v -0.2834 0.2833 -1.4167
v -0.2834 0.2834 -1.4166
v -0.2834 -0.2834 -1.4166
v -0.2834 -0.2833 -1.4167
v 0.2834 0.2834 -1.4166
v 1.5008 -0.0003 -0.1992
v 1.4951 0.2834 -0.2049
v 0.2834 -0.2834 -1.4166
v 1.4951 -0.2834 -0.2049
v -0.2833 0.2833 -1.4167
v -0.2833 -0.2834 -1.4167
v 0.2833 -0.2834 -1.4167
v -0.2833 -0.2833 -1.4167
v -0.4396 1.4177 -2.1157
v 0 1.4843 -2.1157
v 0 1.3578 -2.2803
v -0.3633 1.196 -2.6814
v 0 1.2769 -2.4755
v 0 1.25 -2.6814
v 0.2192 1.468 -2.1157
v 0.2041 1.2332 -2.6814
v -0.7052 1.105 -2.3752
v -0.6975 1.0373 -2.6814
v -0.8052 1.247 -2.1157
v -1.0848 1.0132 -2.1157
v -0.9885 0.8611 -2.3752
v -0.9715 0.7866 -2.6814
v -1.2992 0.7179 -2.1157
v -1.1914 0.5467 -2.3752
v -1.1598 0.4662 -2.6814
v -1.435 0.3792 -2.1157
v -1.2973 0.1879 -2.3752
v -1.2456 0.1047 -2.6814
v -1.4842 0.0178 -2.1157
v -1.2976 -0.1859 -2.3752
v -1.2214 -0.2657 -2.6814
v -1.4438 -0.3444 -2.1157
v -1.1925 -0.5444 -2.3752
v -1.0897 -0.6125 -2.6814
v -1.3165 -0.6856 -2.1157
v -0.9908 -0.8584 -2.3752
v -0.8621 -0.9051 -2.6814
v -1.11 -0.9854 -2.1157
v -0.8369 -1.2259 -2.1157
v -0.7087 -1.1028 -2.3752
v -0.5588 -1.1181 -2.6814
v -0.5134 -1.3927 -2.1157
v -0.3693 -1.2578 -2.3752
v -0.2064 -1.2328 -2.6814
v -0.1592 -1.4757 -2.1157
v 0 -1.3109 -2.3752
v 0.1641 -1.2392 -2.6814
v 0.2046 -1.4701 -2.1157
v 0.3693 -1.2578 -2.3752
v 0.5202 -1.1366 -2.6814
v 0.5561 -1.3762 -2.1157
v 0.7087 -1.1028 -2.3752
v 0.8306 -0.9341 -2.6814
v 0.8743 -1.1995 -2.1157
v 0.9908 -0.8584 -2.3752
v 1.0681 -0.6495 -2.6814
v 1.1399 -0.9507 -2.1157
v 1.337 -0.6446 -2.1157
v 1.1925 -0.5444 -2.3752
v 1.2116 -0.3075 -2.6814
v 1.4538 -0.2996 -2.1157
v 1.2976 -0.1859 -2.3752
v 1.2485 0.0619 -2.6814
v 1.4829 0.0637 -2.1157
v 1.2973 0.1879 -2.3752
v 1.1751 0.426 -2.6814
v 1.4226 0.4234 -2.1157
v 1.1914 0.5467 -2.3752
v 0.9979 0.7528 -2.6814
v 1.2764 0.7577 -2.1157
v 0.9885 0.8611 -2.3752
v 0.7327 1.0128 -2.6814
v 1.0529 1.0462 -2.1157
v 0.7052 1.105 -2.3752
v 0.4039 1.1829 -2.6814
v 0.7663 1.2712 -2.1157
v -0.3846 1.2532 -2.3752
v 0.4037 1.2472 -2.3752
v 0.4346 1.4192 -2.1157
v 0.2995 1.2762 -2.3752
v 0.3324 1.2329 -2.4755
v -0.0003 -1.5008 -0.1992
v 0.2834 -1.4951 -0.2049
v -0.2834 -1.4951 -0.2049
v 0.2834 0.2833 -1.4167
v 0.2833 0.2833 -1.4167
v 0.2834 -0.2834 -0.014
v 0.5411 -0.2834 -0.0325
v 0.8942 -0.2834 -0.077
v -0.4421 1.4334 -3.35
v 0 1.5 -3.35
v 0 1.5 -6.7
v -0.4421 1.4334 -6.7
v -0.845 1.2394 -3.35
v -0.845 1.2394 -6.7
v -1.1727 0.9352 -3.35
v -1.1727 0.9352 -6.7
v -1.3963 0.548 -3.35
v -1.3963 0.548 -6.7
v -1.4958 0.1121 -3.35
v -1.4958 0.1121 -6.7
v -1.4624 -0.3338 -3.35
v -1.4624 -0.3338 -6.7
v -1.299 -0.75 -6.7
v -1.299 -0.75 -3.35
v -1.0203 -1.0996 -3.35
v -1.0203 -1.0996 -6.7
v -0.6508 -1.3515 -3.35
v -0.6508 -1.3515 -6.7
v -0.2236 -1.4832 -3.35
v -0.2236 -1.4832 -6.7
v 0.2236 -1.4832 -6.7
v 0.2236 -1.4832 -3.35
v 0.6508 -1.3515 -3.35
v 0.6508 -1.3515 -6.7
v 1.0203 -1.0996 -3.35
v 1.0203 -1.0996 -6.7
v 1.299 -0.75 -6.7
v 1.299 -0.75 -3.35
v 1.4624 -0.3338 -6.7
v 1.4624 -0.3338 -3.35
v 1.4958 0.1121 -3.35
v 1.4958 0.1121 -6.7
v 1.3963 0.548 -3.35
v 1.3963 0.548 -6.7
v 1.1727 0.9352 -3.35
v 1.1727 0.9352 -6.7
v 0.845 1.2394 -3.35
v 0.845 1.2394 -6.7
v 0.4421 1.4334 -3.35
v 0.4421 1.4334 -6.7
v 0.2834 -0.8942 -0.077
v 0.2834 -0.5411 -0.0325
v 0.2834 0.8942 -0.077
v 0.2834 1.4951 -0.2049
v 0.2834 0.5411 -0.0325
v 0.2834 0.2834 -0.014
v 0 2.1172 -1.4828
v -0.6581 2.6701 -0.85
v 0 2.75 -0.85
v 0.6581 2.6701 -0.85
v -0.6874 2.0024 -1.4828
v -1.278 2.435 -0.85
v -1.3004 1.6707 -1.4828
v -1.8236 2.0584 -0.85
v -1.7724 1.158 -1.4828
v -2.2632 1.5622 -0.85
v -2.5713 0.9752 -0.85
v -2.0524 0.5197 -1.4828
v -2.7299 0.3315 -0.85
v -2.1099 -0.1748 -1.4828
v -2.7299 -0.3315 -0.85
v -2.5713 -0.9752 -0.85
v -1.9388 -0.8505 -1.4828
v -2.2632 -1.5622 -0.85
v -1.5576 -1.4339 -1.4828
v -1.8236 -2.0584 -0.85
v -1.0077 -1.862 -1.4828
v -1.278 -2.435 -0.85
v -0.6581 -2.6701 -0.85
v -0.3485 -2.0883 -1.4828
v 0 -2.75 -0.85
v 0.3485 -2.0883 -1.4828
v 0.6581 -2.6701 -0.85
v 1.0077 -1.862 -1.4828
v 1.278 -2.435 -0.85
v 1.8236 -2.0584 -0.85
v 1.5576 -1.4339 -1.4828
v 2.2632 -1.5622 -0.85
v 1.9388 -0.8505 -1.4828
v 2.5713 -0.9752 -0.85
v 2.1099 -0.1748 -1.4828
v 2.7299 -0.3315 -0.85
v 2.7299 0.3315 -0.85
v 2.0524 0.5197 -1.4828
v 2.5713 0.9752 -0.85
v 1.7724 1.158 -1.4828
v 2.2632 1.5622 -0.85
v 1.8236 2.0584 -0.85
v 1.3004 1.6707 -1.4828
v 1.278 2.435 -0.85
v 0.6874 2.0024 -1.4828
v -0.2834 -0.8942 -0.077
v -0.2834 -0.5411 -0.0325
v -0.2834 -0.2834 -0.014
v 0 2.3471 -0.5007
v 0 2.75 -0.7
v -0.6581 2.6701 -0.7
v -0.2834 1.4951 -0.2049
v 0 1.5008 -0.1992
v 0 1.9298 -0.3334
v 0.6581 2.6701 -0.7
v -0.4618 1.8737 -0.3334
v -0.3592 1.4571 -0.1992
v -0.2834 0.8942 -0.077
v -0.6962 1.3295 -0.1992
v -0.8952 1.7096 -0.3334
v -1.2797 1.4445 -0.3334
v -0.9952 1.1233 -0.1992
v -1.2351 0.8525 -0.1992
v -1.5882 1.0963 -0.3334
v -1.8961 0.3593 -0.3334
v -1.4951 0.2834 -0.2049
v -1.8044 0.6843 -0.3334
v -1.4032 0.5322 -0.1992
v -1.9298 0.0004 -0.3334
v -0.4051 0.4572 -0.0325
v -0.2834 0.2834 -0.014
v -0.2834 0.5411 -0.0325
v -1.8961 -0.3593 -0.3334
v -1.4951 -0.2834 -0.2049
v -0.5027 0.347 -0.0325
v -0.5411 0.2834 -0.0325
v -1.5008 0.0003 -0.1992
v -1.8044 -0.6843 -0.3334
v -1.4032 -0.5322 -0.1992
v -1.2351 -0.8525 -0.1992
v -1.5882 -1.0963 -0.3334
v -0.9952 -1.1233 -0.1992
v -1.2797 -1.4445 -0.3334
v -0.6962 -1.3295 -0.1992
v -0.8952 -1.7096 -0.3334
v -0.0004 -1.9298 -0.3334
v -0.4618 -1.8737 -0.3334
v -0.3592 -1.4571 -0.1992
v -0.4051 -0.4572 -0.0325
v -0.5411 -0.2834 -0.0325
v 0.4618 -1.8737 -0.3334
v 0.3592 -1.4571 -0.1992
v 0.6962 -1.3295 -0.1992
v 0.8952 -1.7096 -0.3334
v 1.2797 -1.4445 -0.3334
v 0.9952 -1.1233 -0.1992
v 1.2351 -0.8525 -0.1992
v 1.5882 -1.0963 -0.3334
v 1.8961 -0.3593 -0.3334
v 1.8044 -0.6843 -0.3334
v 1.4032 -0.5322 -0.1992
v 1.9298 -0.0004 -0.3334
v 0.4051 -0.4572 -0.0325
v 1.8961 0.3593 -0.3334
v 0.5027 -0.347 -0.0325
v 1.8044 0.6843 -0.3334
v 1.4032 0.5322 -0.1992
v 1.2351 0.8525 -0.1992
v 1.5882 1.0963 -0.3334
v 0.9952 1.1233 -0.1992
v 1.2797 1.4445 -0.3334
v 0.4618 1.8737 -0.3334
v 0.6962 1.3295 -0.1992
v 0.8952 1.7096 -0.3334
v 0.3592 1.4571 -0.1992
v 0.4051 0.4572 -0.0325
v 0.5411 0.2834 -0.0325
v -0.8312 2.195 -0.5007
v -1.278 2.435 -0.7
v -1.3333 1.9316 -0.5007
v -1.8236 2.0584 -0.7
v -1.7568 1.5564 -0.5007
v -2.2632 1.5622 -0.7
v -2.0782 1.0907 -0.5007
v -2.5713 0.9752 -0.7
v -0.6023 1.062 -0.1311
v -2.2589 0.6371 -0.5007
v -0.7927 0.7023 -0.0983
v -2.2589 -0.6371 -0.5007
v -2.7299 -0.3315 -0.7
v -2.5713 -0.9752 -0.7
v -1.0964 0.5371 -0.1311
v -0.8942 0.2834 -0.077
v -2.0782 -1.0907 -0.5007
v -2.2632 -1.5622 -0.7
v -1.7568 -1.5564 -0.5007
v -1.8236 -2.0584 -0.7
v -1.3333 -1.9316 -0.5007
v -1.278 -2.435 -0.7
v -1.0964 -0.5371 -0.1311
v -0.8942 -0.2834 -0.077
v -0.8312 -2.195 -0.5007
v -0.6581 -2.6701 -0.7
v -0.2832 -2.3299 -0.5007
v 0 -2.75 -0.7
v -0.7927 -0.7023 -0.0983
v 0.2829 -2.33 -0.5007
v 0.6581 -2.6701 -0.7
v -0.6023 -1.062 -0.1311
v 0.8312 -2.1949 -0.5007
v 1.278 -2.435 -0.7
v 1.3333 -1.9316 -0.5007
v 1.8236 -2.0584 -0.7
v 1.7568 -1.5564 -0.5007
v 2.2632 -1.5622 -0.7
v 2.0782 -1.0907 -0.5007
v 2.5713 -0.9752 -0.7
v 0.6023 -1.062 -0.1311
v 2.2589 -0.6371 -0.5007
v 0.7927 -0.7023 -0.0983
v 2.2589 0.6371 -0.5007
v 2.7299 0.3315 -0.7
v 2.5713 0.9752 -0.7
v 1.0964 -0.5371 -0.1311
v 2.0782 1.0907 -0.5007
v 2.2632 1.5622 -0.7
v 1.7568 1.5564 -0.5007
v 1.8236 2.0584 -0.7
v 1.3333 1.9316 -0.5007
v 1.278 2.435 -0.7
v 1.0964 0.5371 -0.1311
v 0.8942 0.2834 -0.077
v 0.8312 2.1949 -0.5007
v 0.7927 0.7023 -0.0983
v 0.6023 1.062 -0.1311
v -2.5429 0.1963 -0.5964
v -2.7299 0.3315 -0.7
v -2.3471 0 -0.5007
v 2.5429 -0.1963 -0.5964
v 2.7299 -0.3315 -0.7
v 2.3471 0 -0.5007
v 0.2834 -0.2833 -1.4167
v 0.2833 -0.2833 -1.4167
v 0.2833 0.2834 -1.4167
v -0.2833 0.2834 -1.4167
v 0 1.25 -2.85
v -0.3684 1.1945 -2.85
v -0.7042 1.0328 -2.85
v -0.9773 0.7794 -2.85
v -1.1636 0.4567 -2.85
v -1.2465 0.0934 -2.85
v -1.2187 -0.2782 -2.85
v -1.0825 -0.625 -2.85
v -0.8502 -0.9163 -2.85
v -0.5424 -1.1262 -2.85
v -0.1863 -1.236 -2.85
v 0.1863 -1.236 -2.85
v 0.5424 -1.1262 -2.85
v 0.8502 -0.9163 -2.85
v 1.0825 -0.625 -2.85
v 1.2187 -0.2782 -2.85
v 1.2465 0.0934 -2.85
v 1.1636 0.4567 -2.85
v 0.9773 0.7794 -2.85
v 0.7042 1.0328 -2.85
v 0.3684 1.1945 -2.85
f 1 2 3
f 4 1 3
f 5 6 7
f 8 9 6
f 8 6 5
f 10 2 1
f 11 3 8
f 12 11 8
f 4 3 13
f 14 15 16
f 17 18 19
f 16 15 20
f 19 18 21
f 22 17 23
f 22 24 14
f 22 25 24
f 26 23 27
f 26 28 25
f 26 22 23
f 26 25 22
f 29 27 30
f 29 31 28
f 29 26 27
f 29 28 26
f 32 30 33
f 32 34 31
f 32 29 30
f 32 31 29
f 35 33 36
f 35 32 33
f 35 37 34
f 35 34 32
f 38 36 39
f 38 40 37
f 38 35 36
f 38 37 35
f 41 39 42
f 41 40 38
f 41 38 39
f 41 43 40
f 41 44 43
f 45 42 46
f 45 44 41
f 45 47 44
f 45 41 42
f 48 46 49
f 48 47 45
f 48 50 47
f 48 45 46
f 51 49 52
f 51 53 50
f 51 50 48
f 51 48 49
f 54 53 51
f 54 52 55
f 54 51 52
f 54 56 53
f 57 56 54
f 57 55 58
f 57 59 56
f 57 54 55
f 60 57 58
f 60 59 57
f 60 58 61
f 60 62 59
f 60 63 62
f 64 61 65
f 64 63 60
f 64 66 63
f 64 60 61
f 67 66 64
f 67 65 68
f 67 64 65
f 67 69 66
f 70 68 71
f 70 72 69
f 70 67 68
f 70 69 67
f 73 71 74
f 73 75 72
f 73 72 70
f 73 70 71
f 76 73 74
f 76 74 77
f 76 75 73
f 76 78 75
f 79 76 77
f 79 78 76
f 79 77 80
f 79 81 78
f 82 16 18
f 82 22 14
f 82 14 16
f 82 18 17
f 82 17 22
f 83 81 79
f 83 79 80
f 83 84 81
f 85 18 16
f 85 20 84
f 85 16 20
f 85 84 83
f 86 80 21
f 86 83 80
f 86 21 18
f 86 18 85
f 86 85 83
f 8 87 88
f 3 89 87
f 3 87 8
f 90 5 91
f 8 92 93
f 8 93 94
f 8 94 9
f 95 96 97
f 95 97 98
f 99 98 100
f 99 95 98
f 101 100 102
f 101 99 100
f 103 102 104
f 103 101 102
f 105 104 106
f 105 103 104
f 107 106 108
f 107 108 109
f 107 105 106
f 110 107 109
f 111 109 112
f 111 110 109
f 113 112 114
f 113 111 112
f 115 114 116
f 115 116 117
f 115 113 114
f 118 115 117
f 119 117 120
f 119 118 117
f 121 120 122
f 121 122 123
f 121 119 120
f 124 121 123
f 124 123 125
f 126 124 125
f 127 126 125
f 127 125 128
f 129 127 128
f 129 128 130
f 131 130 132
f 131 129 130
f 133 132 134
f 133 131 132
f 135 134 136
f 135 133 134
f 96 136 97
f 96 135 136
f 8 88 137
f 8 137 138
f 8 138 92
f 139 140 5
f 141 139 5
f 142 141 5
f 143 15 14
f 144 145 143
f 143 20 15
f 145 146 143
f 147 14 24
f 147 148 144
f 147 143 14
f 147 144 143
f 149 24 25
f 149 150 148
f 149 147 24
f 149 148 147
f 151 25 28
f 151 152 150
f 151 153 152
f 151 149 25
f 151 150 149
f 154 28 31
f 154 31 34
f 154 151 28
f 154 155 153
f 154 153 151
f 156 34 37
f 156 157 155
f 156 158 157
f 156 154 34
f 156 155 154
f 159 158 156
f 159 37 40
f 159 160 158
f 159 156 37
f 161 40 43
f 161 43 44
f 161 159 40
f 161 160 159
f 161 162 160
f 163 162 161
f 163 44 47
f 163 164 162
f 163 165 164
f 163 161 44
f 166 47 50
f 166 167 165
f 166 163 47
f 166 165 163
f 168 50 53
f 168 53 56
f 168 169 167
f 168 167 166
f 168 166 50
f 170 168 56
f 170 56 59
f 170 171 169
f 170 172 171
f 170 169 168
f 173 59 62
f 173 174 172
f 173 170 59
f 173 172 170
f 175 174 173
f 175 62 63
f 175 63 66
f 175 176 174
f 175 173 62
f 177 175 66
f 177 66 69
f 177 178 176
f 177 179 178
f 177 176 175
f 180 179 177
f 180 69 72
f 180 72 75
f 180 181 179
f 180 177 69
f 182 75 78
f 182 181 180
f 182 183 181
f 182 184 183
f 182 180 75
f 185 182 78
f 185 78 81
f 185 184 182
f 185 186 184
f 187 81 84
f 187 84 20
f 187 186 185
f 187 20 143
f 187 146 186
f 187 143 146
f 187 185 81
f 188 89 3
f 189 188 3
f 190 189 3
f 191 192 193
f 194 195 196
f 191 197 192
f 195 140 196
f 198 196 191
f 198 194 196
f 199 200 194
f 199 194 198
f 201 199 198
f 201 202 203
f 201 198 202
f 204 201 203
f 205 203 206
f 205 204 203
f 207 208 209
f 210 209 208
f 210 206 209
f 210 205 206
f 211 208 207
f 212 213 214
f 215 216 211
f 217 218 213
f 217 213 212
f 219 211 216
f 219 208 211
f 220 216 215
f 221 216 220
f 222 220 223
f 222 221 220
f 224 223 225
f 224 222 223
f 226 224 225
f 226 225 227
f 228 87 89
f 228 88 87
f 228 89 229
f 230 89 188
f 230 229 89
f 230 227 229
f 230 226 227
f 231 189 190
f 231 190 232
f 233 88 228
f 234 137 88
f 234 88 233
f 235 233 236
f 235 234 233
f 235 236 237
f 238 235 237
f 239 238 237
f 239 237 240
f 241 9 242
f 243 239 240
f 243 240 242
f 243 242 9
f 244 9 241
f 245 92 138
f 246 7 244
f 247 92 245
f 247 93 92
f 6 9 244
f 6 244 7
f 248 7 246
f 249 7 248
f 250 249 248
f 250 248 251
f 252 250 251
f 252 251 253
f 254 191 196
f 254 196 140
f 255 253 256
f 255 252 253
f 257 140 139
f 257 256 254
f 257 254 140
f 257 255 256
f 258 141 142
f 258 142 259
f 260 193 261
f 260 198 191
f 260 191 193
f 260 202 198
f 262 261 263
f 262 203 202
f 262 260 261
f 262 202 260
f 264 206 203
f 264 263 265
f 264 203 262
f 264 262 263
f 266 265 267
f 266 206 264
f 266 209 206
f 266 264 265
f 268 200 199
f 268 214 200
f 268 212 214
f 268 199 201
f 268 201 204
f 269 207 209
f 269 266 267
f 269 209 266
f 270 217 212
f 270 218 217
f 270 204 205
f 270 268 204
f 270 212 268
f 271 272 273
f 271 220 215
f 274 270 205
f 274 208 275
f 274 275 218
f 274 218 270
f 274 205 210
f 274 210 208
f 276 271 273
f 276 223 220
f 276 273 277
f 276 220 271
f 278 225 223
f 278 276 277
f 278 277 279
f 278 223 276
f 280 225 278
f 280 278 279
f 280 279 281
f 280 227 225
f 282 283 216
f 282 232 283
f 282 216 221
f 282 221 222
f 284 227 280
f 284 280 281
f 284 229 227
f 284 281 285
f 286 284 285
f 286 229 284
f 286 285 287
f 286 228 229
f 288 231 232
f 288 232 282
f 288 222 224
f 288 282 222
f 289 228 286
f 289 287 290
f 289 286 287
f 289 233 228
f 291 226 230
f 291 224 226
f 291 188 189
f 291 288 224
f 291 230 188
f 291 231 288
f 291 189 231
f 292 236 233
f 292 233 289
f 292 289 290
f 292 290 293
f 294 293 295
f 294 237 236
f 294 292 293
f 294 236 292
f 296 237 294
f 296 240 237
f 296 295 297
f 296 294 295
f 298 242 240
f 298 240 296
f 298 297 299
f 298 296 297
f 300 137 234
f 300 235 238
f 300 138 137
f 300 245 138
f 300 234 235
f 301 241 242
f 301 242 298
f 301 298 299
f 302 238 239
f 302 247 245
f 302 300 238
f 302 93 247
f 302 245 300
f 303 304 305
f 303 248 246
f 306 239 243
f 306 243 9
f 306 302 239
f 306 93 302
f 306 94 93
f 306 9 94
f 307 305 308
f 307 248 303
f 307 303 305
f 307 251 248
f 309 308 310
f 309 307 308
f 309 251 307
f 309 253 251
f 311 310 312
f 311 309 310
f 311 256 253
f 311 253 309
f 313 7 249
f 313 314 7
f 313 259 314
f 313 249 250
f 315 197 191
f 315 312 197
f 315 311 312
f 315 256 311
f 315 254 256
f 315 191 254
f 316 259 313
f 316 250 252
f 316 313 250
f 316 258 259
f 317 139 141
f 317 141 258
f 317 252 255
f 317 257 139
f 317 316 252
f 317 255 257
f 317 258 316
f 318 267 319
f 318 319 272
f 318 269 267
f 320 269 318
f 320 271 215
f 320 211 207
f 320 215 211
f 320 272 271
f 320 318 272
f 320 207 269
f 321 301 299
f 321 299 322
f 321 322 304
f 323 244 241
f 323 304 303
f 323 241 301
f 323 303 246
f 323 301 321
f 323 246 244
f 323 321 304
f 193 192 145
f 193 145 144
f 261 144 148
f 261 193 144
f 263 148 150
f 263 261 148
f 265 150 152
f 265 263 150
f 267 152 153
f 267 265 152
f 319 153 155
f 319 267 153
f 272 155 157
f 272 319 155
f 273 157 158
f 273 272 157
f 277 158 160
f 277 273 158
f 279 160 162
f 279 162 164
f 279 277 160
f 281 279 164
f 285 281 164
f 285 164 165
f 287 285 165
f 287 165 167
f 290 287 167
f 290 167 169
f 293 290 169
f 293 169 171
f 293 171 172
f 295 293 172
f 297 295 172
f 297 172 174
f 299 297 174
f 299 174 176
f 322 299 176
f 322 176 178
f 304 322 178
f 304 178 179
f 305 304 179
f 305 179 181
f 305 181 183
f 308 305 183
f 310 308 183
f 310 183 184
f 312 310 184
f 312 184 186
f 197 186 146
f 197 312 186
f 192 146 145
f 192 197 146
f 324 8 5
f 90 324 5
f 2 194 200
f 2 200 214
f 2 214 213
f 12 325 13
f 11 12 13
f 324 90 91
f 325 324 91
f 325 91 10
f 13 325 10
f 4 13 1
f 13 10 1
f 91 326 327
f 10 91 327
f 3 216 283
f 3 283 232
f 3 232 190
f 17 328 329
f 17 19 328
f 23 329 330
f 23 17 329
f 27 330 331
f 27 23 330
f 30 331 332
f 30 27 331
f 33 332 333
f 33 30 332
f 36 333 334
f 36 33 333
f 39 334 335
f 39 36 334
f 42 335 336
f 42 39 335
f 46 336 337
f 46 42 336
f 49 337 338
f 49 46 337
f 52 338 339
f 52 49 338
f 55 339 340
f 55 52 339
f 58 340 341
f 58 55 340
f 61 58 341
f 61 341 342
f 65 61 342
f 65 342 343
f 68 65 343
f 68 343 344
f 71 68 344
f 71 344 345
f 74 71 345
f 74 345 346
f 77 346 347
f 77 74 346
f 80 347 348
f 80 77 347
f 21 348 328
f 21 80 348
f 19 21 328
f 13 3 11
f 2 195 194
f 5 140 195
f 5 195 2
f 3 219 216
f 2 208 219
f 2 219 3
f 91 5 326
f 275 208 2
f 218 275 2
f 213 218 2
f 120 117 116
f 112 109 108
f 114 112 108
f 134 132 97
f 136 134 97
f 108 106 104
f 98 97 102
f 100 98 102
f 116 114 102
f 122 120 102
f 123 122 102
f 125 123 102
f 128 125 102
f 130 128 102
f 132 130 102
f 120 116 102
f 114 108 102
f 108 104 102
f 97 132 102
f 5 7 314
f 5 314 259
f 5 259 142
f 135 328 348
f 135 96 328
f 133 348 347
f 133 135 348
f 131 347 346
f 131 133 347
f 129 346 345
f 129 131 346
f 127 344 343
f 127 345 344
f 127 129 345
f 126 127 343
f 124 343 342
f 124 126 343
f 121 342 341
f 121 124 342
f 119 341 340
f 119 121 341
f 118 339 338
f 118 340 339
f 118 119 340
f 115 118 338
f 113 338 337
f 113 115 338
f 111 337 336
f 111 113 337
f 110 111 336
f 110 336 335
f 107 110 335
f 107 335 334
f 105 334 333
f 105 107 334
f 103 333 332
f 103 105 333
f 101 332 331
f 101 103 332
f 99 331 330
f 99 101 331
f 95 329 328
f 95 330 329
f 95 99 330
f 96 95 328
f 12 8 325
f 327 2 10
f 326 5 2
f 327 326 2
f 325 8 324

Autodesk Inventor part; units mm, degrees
ref_plane "WorkPlane2" through (0, 0, 0) normal (0, 0, 1) x (1, 0, 0)
sketch "Sketch1" plane through (0, 0, 0) normal (1, 0, 0) x (0, 1, 0)
  point P0 (0, 0)
ref_plane "Work Plane2" through (0, 0, -2.35) normal (0, 0, 1) x (1, 0, 0)
ref_plane "WorkPlane3" through (0, 0, 7) normal (0, 0, 1) x (1, 0, 0)
sketch "Sketch2" plane through (0, 0, 0) normal (0, 1, 0) x (-1, 0, 0)
  point P0 (0, 0)
sketch "Sketch3" plane through (0, 0, 0) normal (1, 0, 0) x (0, 1, 0)
  line L0 (1.5, -3.35) -> (1.25, -2.85)
  line L1 (1.5, -6.7) -> (1.5, -3.35)
  line L2 (0, -6.7) -> (1.5, -6.7)
  line L3 (0, 0) -> (0, -6.7)
  arc A0 (2.75, -0.7) -> (0, 0) centre (0, -5.7518) ccw
  line L4 (2.75, -0.85) -> (2.75, -0.7)
  line L5 (1.25, -2.35) -> (2.75, -0.85)
  line L6 (1.25, -2.85) -> (1.25, -2.35)
  line L7 (0, -31.6445) -> (0, 31.6445) construction
  line L8 (0, -31.6445) -> (0, 31.6445)
  line L9 (0, -44.3023) -> (0, 44.3023) projected
  dimension "d2" = 1.5
  dimension "d4" = 1.25
  dimension "d6" = 0.5
  dimension "d8" = 1.65
  dimension "d10" = 135
  dimension "d12" = 2.75
  dimension "d14" = 0
  dimension "d16" = 0.7
  dimension "d18" = 6
  dimension "d22" = 3.35
revolve "Revolution1" add sketch "Sketch3" angle 360 about axis through (0, 0, -31.6445) along (0, 0, 1)
fillet "Fillet1" radius 0.8 1 edges at (0, -1.25, -2.35)
sketch "Sketch4" plane through (0, 0, 0) normal (0, 1, 0) x (-1, 0, 0)
  line L0 (0, 0) -> (-1.7, 0)
  line L1 (0, -1.4167) -> (0, 0)
  line L2 (-1.7, 0) -> (-0.2833, -1.4167)
  line L3 (0, -6.9021) -> (0, 1.1504) projected
  arc A0 (2.75, -0.7) -> (-2.75, -0.7) centre (0, -5.7518) ccw projected
  line L4 (0, -1.4167) -> (-0.2833, -1.4167)
  point P0 (0, -1.7)
  dimension "d30" = 45
  dimension "d33" = 3.4
  dimension "d34" = 0.2833
  dimension "d35" = 90
extrude "Extrusion1" cut sketch "Sketch4" along normal mid plane 0.5667
pattern_circular "PolarArray1" count 4 over 360 about axis through (0, 0, -10) along (0, 0, 1) of "Extrusion1"
thread "Thread1" size "M3x0.5" class "6g" standard "ISO Metric profile" full length
ref_plane "MSC_PF1" through (0, 0, 0) normal (1, 0, 0) x (0, 1, 0)
ref_plane "MSC_PT1" through (0, 2.75, -0.85) normal (0, 0, -1) x (-1, 0, 0)
equation "\"d2\" = 0.5 * NND"
equation "\"d4\" = 0.5 * msp_mdtds"
equation "\"d6\" = msp_x"
equation "\"d8\" = ParK"
equation "\"d12\" = 0.5 * Dk"
equation "\"d16\" = ParF"
equation "\"d18\" = NLG"
equation "\"d22\" = b"
equation "\"d24\" = r"
equation "\"d33\" = M"
equation "\"d34\" = 0.0833333 * M"
equation "\"d31\" = 0.166667 * M"
equation "\"d39\" = b"
equation "\"PTC\" = 0.5"
equation "\"msp_x\" = PTC"
equation "\"NLG\" = 6"
equation "\"NND\" = 3"
equation "\"ParK\" = 1.65"
equation "\"r\" = 0.8"
equation "\"msp_mdtds\" = NND - PTC"
equation "\"b\" = 3.35"
equation "\"Dk\" = 5.5"
equation "\"ParF\" = 0.7"
equation "\"M\" = 3.4"
equation "\"ParA\" = 1"
equation "\"THREADDIA\" = NND"
equation "\"TEMPLATE\" = 1.2345"
properties part number "ISO 7047 - M3x6 - 4.8 - H" material "Steel"
